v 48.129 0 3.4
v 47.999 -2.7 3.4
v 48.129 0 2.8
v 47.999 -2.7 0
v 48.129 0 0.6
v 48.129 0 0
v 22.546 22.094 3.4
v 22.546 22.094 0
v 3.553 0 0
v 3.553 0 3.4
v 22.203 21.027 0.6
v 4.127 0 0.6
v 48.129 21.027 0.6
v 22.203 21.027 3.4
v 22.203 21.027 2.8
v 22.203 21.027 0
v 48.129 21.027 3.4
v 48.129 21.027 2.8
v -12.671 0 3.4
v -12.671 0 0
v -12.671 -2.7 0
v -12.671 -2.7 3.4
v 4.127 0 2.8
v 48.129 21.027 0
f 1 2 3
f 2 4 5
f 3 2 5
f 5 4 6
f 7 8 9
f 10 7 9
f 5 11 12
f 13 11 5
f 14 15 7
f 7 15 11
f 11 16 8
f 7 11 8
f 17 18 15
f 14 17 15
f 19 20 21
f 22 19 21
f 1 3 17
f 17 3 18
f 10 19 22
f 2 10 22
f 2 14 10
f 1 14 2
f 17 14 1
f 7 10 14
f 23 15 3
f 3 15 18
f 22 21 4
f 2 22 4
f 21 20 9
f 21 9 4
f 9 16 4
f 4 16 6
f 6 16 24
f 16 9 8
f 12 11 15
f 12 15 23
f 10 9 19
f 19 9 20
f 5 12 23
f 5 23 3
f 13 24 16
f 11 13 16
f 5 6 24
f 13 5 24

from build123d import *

# Parameters (mm, degrees)
F1_DEPTH = 3.4
F2_START = 0.6
F2_DEPTH = 2.2


with BuildPart() as f1:
    # F0 (on Top) → F1 (new body)
    with BuildSketch(Plane.XY):
        Polygon((22.546146065, 22.093931213), (3.5531178582, 0), (4.1273287497, 0), (22.2029884881, 21.0267882794), align=None)
        Polygon((22.2029884881, 21.0267882794), (4.1273287497, 0), (48.128593713, 0), (48.128593713, 21.0267882794), align=None)
        Polygon((3.5531178582, 0), (-12.671406287, 0), (-12.671406287, -2.7), (47.9993857443, -2.7), (48.128593713, 0), (4.1273287497, 0), align=None)
    extrude(amount=F1_DEPTH)

    # F0 (on Top) → F2 (cut)
    with BuildSketch(Plane.XY.offset(F2_START)):
        Polygon((22.2029884881, 21.0267882794), (4.1273287497, 0), (48.128593713, 0), (48.128593713, 21.0267882794), align=None)
        Polygon((48.128593713, 22.093931213), (22.546146065, 22.093931213), (22.2029884881, 21.0267882794), (48.128593713, 21.0267882794), align=None)
    extrude(amount=F2_DEPTH, mode=Mode.SUBTRACT)


solid = f1.part
